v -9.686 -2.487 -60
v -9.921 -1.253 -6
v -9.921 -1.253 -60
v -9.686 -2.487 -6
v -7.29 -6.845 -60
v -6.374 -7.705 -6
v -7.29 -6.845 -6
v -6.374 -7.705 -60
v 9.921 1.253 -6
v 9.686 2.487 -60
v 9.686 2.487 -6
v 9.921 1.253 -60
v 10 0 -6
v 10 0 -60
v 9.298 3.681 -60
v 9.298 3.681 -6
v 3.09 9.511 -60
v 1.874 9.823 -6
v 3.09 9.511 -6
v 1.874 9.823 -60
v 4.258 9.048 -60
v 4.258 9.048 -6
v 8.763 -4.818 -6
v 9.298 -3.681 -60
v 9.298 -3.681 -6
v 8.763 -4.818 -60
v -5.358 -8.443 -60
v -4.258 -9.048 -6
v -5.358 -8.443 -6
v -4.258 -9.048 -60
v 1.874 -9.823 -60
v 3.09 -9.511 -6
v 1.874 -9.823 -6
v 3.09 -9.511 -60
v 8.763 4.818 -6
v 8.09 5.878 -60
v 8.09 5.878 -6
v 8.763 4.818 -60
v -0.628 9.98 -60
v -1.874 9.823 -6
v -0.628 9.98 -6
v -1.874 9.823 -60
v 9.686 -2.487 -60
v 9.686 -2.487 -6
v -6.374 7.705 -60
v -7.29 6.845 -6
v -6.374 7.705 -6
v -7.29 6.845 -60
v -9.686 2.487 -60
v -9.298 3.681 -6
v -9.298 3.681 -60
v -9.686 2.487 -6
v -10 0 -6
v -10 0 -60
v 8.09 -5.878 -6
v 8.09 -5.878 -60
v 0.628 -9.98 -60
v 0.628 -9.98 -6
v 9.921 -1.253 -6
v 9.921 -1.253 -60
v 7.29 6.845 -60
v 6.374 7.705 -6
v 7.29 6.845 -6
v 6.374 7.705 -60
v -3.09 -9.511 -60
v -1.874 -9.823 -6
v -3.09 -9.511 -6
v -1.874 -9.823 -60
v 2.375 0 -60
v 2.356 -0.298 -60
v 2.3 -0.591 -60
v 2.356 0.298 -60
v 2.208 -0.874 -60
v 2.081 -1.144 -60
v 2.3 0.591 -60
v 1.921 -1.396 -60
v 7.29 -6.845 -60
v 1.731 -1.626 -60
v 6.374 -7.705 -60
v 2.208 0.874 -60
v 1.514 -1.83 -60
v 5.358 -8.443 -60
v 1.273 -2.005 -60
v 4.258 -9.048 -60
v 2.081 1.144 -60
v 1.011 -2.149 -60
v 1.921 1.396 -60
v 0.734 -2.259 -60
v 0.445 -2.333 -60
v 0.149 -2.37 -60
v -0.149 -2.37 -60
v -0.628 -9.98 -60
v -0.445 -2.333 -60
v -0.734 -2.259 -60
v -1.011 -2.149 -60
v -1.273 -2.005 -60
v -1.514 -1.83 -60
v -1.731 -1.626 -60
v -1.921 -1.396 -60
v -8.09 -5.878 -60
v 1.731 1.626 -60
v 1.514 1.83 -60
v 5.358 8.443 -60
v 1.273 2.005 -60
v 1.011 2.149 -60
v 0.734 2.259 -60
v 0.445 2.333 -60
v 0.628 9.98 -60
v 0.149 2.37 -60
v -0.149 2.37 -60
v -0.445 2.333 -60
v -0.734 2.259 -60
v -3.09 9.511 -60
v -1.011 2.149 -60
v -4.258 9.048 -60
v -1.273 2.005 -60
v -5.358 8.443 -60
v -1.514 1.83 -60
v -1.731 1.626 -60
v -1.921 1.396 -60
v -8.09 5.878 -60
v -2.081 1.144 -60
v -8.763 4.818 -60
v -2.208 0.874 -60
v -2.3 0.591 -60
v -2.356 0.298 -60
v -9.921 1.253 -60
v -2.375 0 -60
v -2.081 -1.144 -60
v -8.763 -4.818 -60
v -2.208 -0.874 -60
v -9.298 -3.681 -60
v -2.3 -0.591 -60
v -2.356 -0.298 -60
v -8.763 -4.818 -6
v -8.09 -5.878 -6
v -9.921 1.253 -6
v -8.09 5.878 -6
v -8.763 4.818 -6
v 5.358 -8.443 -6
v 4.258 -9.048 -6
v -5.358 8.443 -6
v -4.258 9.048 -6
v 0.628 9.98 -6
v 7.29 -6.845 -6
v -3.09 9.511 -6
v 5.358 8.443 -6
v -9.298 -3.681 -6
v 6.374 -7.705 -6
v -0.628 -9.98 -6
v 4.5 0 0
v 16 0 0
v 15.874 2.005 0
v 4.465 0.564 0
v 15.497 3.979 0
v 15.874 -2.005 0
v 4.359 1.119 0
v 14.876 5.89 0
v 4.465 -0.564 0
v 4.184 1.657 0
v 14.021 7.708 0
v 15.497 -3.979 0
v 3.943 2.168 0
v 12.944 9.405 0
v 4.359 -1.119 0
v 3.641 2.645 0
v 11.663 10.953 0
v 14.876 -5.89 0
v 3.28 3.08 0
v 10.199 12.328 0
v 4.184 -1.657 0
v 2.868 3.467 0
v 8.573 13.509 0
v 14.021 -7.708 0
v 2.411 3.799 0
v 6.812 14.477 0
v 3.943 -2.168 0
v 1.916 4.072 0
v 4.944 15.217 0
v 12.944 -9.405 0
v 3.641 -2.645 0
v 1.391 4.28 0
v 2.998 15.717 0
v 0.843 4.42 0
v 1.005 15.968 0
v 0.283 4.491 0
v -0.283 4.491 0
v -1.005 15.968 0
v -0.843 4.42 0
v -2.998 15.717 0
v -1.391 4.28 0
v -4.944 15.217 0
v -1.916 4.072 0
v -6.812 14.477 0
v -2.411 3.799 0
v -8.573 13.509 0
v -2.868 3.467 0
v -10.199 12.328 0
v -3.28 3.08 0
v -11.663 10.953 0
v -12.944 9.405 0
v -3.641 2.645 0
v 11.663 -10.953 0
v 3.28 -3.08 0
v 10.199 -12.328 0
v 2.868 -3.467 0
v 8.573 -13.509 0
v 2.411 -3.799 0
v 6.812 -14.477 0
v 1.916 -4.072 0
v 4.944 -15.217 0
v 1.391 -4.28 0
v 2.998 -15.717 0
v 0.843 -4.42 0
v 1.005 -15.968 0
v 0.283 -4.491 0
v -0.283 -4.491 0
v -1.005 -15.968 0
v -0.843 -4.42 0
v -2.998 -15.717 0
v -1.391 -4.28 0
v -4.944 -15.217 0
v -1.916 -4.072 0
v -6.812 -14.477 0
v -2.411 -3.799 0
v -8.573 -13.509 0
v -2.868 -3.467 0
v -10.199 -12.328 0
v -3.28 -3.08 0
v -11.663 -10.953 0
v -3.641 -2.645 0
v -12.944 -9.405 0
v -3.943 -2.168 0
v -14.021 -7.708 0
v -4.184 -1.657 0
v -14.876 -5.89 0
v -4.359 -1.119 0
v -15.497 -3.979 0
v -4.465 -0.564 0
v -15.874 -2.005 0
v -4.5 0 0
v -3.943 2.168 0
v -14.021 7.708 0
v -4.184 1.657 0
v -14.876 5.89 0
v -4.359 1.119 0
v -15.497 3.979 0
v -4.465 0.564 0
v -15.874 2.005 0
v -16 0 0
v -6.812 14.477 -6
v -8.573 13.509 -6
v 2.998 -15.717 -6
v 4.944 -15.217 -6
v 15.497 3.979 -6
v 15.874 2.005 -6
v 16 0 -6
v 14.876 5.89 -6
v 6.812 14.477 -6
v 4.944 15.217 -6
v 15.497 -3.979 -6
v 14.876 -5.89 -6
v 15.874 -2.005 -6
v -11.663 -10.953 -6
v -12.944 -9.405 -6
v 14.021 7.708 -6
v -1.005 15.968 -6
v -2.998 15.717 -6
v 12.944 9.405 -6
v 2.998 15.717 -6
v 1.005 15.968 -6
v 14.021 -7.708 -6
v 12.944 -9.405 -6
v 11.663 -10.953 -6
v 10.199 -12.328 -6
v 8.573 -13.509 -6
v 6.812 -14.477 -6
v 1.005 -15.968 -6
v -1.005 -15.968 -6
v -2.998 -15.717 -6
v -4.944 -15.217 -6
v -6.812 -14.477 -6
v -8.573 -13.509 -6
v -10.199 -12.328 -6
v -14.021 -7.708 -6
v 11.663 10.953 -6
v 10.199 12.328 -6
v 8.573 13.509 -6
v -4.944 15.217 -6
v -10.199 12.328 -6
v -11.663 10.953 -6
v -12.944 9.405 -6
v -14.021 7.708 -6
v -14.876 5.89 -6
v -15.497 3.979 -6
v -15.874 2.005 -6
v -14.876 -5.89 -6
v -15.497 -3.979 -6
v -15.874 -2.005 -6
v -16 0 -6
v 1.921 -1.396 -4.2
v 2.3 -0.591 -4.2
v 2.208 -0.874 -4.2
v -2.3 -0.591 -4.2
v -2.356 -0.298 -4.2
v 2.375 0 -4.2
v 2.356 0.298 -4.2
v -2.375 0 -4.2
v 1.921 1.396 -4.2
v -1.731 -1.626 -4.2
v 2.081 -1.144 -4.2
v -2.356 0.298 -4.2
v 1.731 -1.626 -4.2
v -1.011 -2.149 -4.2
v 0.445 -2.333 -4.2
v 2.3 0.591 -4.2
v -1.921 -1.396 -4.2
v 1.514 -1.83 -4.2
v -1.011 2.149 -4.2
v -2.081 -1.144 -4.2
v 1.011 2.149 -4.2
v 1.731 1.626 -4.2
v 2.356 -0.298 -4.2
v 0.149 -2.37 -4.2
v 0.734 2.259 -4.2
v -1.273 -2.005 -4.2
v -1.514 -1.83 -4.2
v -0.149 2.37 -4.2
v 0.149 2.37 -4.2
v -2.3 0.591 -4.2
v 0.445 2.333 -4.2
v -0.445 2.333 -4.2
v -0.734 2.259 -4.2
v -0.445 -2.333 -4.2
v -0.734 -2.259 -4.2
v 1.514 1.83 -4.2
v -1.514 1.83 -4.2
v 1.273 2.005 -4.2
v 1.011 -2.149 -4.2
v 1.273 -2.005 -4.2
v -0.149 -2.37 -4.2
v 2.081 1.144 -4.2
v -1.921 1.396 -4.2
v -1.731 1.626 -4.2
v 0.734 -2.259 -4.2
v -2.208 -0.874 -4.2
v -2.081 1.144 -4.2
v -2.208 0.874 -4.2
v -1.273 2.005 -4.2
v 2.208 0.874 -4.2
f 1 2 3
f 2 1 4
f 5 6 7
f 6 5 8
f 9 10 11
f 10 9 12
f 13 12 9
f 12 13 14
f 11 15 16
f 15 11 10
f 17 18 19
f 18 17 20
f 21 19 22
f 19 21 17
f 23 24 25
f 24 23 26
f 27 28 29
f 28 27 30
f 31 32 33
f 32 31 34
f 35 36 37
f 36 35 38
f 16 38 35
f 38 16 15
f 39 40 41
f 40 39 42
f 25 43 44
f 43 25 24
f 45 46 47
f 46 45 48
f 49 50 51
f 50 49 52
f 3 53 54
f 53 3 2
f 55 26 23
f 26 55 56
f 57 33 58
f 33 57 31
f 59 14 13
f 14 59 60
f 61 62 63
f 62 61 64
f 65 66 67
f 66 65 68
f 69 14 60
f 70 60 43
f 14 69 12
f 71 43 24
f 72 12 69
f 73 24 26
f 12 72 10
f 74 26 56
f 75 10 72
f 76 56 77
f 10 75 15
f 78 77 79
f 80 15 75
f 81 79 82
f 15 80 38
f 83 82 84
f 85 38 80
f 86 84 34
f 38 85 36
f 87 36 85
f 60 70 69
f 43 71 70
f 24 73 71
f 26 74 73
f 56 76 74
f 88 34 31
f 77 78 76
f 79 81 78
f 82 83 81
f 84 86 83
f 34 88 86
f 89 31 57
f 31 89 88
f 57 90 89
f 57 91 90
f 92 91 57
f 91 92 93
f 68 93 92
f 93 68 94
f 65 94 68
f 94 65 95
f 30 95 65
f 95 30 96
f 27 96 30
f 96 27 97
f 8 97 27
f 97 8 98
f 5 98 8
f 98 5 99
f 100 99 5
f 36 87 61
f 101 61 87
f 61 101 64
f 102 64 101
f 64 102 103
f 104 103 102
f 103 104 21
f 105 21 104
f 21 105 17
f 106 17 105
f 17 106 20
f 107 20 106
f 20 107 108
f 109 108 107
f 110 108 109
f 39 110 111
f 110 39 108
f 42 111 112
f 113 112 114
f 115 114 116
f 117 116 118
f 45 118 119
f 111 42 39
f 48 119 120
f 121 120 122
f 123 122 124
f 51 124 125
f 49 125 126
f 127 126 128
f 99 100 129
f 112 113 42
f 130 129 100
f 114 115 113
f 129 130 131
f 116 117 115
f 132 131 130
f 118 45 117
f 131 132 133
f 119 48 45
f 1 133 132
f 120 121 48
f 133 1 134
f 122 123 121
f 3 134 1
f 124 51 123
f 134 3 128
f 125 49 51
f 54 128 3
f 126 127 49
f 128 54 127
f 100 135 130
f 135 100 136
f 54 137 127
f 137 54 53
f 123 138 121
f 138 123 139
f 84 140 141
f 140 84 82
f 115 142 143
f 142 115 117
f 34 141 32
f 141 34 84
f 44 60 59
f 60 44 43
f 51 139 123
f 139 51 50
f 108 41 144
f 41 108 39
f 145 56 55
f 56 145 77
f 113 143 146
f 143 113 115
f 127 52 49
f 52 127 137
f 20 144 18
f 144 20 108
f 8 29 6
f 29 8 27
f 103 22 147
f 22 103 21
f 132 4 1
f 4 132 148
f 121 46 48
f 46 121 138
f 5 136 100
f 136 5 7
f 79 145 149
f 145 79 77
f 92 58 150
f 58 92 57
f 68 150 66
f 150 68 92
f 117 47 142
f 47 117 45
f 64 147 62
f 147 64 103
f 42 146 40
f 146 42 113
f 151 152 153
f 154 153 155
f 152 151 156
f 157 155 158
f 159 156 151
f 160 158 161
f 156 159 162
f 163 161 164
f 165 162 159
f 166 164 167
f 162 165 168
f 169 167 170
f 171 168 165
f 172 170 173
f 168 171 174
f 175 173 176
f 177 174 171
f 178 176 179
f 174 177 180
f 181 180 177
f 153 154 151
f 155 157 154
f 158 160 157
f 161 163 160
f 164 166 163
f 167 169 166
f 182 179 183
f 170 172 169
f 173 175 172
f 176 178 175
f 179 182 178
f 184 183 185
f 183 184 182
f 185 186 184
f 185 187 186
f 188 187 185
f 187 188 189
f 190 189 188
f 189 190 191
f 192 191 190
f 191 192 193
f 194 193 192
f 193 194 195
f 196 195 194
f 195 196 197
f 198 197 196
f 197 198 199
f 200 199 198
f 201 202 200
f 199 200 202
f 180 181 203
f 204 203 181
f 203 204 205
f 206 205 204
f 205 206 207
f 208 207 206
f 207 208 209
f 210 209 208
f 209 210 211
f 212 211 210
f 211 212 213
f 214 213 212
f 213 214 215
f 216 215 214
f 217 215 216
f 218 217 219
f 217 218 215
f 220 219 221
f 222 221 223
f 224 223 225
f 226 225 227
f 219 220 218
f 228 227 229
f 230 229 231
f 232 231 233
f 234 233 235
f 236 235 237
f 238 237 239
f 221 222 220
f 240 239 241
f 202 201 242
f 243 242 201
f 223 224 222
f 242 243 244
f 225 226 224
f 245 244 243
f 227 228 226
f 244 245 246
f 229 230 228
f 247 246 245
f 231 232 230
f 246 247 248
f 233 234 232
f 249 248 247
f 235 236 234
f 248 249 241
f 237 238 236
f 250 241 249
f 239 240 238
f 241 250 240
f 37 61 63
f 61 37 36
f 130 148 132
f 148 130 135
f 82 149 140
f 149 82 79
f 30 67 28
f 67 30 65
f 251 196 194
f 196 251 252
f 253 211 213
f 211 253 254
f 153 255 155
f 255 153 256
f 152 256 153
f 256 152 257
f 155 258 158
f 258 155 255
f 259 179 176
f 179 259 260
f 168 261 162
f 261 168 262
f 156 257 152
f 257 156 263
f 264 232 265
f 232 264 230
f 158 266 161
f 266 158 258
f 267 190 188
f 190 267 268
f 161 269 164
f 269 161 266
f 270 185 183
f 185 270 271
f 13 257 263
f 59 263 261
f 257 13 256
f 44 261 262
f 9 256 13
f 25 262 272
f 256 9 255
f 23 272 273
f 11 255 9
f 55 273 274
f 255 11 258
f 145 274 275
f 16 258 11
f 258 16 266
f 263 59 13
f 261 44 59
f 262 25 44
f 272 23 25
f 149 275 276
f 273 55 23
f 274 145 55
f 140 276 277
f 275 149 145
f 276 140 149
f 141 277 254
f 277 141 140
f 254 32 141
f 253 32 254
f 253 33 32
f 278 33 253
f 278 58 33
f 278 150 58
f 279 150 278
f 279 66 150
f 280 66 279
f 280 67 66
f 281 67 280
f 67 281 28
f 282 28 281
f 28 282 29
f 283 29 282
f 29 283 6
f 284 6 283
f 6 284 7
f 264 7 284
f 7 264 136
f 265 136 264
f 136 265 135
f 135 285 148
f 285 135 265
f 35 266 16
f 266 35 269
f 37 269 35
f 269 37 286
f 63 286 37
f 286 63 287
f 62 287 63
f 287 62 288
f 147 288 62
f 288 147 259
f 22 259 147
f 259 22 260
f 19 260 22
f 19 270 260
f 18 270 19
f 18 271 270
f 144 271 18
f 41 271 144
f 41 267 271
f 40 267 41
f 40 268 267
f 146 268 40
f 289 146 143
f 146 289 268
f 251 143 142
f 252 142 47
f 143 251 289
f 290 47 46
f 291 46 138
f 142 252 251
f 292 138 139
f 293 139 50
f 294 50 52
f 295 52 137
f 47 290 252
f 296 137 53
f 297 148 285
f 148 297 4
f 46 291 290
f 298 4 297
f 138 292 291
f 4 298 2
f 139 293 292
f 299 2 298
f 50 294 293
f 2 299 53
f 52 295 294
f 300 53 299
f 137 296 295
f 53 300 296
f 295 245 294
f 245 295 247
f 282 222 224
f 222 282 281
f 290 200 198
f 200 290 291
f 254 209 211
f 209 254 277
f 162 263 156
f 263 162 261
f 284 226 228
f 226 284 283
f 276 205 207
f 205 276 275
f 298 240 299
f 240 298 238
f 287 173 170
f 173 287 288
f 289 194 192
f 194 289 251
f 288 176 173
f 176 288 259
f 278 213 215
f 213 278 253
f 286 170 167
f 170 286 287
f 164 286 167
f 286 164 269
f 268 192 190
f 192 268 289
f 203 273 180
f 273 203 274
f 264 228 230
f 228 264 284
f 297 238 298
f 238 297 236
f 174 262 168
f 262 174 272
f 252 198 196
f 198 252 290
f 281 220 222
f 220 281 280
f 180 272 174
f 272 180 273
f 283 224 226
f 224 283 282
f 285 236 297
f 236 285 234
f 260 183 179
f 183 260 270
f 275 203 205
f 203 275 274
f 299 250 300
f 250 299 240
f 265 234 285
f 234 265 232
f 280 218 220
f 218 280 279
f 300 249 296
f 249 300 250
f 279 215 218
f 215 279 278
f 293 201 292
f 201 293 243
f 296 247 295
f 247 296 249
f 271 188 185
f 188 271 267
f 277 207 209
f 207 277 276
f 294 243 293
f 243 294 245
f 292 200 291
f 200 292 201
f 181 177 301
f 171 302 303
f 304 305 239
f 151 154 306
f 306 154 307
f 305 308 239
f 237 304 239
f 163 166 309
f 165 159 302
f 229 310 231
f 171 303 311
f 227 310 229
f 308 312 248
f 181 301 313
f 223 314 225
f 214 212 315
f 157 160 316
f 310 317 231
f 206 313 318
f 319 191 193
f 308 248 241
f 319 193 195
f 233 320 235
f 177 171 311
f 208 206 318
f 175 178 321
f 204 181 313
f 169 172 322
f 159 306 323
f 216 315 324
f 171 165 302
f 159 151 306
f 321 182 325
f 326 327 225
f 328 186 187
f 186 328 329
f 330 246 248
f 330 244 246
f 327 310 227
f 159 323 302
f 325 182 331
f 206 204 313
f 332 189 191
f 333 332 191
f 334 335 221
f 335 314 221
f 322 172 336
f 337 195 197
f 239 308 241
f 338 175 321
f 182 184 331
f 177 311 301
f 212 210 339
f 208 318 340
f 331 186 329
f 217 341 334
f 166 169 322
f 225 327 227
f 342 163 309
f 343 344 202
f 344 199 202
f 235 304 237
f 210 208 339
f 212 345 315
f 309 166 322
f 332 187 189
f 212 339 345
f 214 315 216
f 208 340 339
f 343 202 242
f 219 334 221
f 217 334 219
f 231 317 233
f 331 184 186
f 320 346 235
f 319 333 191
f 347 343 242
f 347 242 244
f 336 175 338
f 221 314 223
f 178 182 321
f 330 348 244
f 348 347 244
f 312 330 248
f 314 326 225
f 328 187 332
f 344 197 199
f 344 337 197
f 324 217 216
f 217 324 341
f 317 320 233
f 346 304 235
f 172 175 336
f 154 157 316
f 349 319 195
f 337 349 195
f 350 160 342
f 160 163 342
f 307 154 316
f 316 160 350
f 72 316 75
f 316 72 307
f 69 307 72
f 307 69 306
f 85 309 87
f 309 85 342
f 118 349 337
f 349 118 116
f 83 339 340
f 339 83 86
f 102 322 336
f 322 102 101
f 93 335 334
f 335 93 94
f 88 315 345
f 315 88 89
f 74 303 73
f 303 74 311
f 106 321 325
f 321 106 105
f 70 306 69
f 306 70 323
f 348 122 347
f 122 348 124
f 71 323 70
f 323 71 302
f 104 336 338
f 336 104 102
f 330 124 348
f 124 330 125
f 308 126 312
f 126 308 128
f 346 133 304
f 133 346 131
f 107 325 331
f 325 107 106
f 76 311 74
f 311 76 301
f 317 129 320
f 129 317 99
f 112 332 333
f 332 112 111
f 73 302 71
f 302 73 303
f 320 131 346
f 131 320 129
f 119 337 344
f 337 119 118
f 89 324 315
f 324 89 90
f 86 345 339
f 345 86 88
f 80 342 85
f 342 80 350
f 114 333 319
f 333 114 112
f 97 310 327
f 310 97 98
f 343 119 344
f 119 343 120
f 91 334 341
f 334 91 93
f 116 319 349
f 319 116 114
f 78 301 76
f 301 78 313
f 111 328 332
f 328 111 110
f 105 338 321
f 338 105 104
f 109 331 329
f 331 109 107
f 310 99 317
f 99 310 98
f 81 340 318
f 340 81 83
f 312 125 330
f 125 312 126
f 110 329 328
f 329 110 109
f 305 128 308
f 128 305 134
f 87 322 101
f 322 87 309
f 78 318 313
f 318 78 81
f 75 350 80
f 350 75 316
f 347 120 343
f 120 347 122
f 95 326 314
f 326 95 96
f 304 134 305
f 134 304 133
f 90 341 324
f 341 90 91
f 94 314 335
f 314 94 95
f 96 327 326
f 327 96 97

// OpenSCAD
$fn = 50;


difference() {
	union() {
		translate(v = [0, 0, -60.0000000000]) {
			cylinder(h = 60, r = 10.0000000000);
		}
		translate(v = [0, 0, -6.0000000000]) {
			cylinder(h = 6, r = 16.0000000000);
		}
	}
	union() {
		translate(v = [0, 0, 0]) {
			rotate(a = [0, 0, 0]) {
				difference() {
					union() {
						#translate(v = [0, 0, -60.0000000000]) {
							cylinder(h = 60, r = 2.2500000000);
						}
						#translate(v = [0, 0, -4.2000000000]) {
							cylinder(h = 4.2000000000, r = 10.0000000000, r1 = 2.3750000000, r2 = 4.5000000000);
						}
						#translate(v = [0, 0, -60.0000000000]) {
							cylinder(h = 60, r = 2.3750000000);
						}
						#translate(v = [0, 0, -60.0000000000]) {
							cylinder(h = 60, r = 2.2500000000);
						}
					}
					union();
				}
			}
		}
	}
}
